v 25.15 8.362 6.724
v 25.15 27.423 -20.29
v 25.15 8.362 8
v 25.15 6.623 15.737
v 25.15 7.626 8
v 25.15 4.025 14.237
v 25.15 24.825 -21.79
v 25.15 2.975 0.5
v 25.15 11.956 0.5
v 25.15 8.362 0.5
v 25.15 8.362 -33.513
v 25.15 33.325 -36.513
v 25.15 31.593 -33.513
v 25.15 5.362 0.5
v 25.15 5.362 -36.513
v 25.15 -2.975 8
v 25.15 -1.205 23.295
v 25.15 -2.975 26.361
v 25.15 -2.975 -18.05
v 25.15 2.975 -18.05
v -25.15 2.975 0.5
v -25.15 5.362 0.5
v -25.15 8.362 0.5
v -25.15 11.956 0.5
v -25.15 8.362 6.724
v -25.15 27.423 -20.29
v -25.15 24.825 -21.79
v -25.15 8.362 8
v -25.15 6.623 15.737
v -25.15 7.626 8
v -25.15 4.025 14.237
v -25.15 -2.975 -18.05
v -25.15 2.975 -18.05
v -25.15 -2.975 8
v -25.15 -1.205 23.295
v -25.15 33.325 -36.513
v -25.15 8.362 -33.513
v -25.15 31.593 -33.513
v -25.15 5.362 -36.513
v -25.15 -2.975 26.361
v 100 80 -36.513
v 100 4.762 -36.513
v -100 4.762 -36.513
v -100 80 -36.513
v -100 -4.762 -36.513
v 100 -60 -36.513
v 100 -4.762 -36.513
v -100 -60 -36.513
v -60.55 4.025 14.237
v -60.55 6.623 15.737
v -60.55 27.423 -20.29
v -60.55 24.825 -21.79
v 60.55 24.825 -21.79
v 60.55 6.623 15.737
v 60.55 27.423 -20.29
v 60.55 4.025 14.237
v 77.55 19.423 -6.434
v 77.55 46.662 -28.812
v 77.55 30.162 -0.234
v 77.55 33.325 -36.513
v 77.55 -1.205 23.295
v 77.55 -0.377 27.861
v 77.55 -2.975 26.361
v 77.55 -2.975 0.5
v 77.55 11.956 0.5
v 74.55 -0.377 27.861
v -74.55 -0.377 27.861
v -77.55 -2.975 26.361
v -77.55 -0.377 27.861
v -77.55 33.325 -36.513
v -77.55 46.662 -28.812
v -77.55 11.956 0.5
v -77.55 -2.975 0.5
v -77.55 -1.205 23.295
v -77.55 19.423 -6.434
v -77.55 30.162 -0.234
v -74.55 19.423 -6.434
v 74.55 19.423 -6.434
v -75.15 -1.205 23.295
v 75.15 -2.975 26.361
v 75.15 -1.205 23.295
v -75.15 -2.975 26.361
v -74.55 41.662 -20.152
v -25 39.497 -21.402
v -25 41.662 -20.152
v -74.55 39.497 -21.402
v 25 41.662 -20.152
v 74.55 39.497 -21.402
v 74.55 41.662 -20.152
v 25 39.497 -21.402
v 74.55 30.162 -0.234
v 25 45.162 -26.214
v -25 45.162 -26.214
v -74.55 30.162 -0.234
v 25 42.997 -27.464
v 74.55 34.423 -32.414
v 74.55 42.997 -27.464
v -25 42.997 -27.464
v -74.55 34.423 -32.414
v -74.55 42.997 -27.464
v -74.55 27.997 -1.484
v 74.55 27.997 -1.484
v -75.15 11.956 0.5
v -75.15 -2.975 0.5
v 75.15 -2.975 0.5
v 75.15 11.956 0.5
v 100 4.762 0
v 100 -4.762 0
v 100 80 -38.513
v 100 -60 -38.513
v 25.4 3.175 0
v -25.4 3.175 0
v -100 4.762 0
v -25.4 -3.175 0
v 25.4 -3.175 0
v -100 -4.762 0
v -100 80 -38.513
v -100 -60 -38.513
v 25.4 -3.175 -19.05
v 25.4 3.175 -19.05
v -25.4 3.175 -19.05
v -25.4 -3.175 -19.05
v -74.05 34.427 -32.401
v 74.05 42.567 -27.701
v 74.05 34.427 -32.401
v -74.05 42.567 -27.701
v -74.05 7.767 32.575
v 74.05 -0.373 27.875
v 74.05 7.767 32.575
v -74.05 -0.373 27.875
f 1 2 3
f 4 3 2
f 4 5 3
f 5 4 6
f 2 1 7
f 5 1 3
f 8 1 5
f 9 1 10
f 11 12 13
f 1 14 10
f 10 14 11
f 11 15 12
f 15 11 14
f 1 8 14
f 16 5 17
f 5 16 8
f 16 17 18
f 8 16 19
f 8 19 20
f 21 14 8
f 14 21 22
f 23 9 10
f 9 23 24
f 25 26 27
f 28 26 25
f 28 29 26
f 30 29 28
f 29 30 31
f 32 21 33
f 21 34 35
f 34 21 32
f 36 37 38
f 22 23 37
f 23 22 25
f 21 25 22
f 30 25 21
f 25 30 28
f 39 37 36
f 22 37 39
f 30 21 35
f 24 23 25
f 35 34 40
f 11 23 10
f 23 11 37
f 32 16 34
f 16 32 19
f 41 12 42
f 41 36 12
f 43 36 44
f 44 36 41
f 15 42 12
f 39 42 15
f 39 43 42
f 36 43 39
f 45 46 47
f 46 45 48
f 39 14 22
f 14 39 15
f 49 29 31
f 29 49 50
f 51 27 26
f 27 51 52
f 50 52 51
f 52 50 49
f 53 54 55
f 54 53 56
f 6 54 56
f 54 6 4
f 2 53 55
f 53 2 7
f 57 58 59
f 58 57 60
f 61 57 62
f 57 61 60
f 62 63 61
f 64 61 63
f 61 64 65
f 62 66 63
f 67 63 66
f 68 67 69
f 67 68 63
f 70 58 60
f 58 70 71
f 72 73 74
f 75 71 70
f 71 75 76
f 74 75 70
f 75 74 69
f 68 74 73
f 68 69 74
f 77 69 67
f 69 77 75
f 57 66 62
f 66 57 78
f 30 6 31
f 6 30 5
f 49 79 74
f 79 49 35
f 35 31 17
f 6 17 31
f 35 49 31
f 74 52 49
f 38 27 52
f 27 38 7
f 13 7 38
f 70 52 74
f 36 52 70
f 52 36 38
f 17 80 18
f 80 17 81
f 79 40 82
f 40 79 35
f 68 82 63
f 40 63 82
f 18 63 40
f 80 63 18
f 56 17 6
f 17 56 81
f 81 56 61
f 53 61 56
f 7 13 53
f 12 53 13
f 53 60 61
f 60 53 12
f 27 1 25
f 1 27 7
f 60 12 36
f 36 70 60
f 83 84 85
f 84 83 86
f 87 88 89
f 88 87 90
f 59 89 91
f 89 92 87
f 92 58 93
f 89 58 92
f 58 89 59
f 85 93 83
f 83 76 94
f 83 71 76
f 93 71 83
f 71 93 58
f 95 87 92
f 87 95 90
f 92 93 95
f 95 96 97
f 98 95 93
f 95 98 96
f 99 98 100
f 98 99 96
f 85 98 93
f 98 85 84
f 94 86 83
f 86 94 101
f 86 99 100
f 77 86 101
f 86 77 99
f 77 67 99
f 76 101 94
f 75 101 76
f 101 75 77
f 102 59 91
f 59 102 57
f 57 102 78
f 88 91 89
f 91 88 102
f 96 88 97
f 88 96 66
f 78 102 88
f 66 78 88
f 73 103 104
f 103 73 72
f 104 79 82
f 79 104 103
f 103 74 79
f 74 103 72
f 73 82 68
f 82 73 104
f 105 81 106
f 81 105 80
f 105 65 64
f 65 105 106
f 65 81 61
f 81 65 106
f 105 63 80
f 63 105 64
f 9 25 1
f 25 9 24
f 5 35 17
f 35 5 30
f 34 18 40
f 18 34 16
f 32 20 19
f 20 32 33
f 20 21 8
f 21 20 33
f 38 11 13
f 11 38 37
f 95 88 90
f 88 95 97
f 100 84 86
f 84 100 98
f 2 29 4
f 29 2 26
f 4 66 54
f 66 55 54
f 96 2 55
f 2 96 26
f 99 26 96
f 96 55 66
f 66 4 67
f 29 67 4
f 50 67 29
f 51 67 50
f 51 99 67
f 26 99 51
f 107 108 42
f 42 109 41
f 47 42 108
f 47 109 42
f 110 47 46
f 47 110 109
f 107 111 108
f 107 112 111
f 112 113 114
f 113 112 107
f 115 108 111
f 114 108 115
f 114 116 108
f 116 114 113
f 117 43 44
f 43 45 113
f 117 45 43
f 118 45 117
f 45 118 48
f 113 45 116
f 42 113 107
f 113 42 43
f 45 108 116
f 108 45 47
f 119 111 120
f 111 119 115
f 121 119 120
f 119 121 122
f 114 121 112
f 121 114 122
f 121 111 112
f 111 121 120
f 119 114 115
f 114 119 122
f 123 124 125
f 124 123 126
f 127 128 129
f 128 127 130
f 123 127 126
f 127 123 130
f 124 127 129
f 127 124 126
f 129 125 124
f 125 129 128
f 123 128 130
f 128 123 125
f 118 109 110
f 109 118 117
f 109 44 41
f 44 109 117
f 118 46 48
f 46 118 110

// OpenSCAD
// ====================================================================
// Player phone holder that plugs into the slot in the TOP of the playing-field border
// One phone, landscape, tilted back so a seated player can read and touch it.
// Dimensions in millimeters (mm). OpenSCAD 2021.01.
// Related: cad/phone_tray_insert.scad (the storage tray insert) and
//          documents/PHONE_TRAY_INSERT_PLAN.md (same phone, same printer).
//
// REVISED 2026-11-17 (2nd): slot is in the TOP of the border (tab points down); nothing may go past
// the back (field-side) face of the tab; the holder stands on the table; prints on its back.
//
// World frame: x runs along the border; y runs across it, y = 0 at the slot's centre, the field
// on the -y side and the player on the +y side; z is up, z = 0 is the border's top face and
// z = -border_h is the table.
//
// One printable part:
//   tab      - a thin blade that drops down into the slot (2" long x 1/4" thick x 3/4" deep)
//   base     - a block that rests on the border's top face between the tab and the outer edge
//   skirt    - a thin plate down the border's OUTER face, standing on the table
//   link     - a strip along the table that joins the skirt's bottom to the cradle's lowest edge
//   cradle   - back plate leaning toward the field, a shelf the phone's long edge stands on, a small
//              front lip and an end post at each end of the phone
//   fill     - a solid block, as wide as the tab, filling the space above the tab (above the border's top
//              face) between the back plane and the cradle's back plate
//   ribs     - one small triangular rib at each end of the cradle, above the border's top face only
//              (there are no ribs below the top of the wall)
//
// The plate leans from the skirt: the steeper the tilt, the closer the phone sits to the wall. The
// plate's back face stays outside the border's outer face (checked by an assert), so the highest
// tilt that works is about 76 degrees. The file is set to 50 (the user's choice).
//
// RULE: no part of the holder is at y < -tab_t/2, the tab's back face. The cradle is pushed OUT
// until its leaning back plate meets that plane at its top, so nothing hangs over the field.
// That plane is also the print bed: the part prints lying on its back with the tab flat on the bed.
//
// PRINTING (part = "print"): the back plane is on the bed. The tab lies flat; the back plate is a
// shallow ramp rising from the bed (90 - tilt degrees from vertical). Everything below the border top (the skirt,
// and the plate and shelf where they hang down toward the table) floats up to about 20 mm above the
// bed: turn on slicer supports, "build plate only", for the plate's back face and the skirt's inner face.
// Cutting the support interface off those two faces is the only cleanup.
//
// MEASURED by the user: border 1 7/16" tall; wall around the slot about 1/16" each side; slot 2" x 1/4" x 3/4".
// ASSUMED: the outer face is flat and vertical right down to the table; the slot is centred (the wall
// is 1/16" on both sides); the table under the holder is level with the table under the border.
// ESTIMATE: the phone's size (retailer spec page).
//
// part = "assembly"  holder + ghost phone + stand-ins for the border and the table (default)
//        "print"     holder only, on its back, as it prints
//        "check"     holder intersected with the phone, the border, the table and the area behind the
//                    tab's back plane; must come out EMPTY
// ====================================================================

part = "assembly";  // "assembly", "print", "check"

// --- 1. SLOT IN THE TOP OF THE BORDER ---
slot_w     = 50.8;       // 2"   : along the border
slot_t     = 6.35;       // 1/4" : across the border
slot_depth = 19.05;      // 3/4" : down into the border

// --- 2. BORDER (measured) ---
slot_to_outer = 1.5875;  // 1/16": wall between the slot and the border's outer face (same on the field side)
border_h      = 36.5125; // 1 7/16": border height = how far down the table is

// --- 3. PHONE (TCL A502DL, same estimates as phone_tray_insert.scad) ---
phone_len  = 148.1;      // ESTIMATE: length (lies along the border, landscape)
phone_w    = 69.6;       // ESTIMATE: width (up the cradle's back plate)
phone_t    = 9.4;        // ESTIMATE: thickness

// --- 4. FIT ---
tab_clear_w = 0.5;       // Tab is narrower than the slot by this (total)
tab_clear_t = 0.4;       // Tab is thinner than the slot by this (total)
tab_inset   = 1.0;       // Tab stops this far short of the slot's bottom
phone_clear = 0.5;       // Gap around the phone: thickness, and 2x this in length
face_gap    = 0.6;       // Gap between the skirt and the border's outer face
top_gap     = 0.5;       // Gap between the base and the border's top face (the holder rests on the table)

// --- 5. POSE ---
tilt        = 60;        // Screen angle from horizontal (90 = upright). Higher = the phone sits closer to the
                         // wall. About 76 is the most that keeps the plate outside the border (assert)
cradle_z    = -border_h; // Height of the cradle's lowest point (the shelf's back-bottom edge) above the
                         // border's top face. -border_h = standing on the table, the lowest it can go.
                         // 0 = level with the border's top. Moving it only moves the phone straight up or
                         // down; it does not change how far out the cradle sits

// --- 6. HOOK (base + skirt) ---
base_h      = 8.0;       // Height of the base block above the border's top face
skirt_t     = 3.0;       // Skirt thickness
hook_w      = slot_w - 0.5;  // Width (along the border) of the base and skirt
link_t      = skirt_t;   // Thickness of the strip along the table that joins the skirt's bottom to the cradle's bottom
link_w      = hook_w;    // Its width (along the border)

// --- 7. CRADLE ---
plate_t     = 3.0;       // Back plate thickness
shelf_t     = 3.0;       // Shelf thickness (under the phone's long edge)
front_lip_t = 2.5;       // Front lip thickness
front_lip_h = 7.0;       // Front lip height above the shelf
end_t       = 3.0;       // End post thickness
end_h       = 30.0;      // End post height above the shelf
back_window = true;      // Cut two windows in the back plate (saves plastic, frees the camera)
window_margin = 14.0;    // Solid plate left around the windows
                         // A solid rib, as wide as the tab, is left between the two windows (see mid_rib_w)
lip_notch_w = 50.0;      // Finger notch cut in the middle of the front lip (0 = none)

// --- 8. RIBS ---
gusset_t    = 2.4;       // Thickness of the rib at each end of the cradle (they sit under the end posts)

// ====================================================================
// DERIVED
// ====================================================================
eps    = 0.01;
tab_w  = slot_w - tab_clear_w;
mid_rib_w = tab_w;                          // width of the solid rib between the two back windows
tab_t  = slot_t - tab_clear_t;
tab_len = slot_depth - tab_inset;

yo     = slot_t / 2 + slot_to_outer;        // border's outer face (and, mirrored, its field-side face)
sk_y0  = yo + face_gap;                     // skirt's inner face
sk_y1  = sk_y0 + skirt_t;                   // skirt's outer face
back_y = -tab_t / 2;                        // THE back plane: nothing goes below this y; it is the print bed

len_in = phone_len + 2 * phone_clear;       // inside length between the end posts
cav_t  = phone_t + phone_clear;             // inside depth of the cradle, plate to front lip
L      = len_in + 2 * end_t;                // overall length of the cradle
plate_h = phone_w;                          // back plate height (the phone's width)

phi = 90 - tilt;                            // rotation of the cradle about X
sp  = sin(phi);
cp  = cos(phi);

// Cradle frame: x along the border; y = depth (plate back at y = -plate_t, plate front at 0);
// z = up the plate. The shelf's top face is at z = 0. Placed by rotate([phi,0,0]) + translate.
// The cradle is pushed out until the plate's top back corner is exactly on the back plane.
yc = back_y + plate_t * cp + plate_h * sp;
zc = plate_t * sp + shelf_t * cp + cradle_z;
function gy(yl, zl) = yl * cp - zl * sp + yc;           // local -> global y
function gz(yl, zl) = yl * sp + zl * cp + zc;           // local -> global z

front_end = cav_t + front_lip_t;            // local y of the shelf's front edge
yB = gy(-plate_t, -shelf_t);                // back-bottom corner of the shelf
zB = gz(-plate_t, -shelf_t);
yF = gy(front_end, -shelf_t);               // front-bottom corner of the shelf
zF = gz(front_end, -shelf_t);
yT = gy(-plate_t, plate_h);                 // top back corner of the plate (= back_y by construction)
zT = gz(-plate_t, plate_h);

assert(tilt > 30 && tilt < 85, "tilt should be between 30 and 85 degrees");
assert(tab_t > 1 && tab_w > 10, "tab is too small: check the slot figures");
y_plate_at_top = yT + zT * tan(phi);        // y of the plate's back face where it crosses the border's top face
assert(y_plate_at_top >= yo + 0.5, str("tilt is too steep: the plate's back face would be inside the border (y = ",
       y_plate_at_top, ", border face at ", yo, "). Lower tilt, or raise cradle_z"));
assert(yB > sk_y1 + 1, "tilt is too steep: the cradle would run into the skirt. Lower tilt");
assert(zB >= -border_h - 0.001, "cradle_z is below the table");
assert(front_lip_t < phone_t, "front lip should be thinner than the phone");
assert(L <= 256 && zT + border_h <= 256 && yF - back_y <= 256, "does not fit the P2S bed (256 x 256 mm)");

echo(str("cradle length=", L, "  shelf front is ", yF - yo, " mm out from the border's outer face",
         "  phone top is ", zT + border_h, " mm above the table",
         "  holder is ", yF - back_y, " mm front to back (the print height)"));

// ====================================================================
// PARTS
// ====================================================================

module tab() {
    translate([-tab_w / 2, back_y, -tab_len])
        cube([tab_w, tab_t, tab_len + top_gap + eps]);
}

// Block on the border's top face from the tab to the skirt, and the skirt down to the table
module hook() {
    translate([-hook_w / 2, back_y, top_gap])
        cube([hook_w, sk_y1 - back_y, base_h - top_gap]);
    translate([-hook_w / 2, sk_y0, -border_h])
        cube([hook_w, skirt_t, border_h + base_h]);
}

// The cradle, in its own frame (before rotating)
module cradle_local() {
    // back plate
    difference() {
        translate([-L / 2, -plate_t, -shelf_t])
            cube([L, plate_t, plate_h + shelf_t]);
        if (back_window)
            // two windows, one each side of the middle rib
            for (s = [-1, 1])
                translate([s > 0 ? mid_rib_w / 2 : -(len_in / 2 - window_margin), -plate_t - 1, window_margin])
                    cube([len_in / 2 - window_margin - mid_rib_w / 2, plate_t + 2, plate_h - 2 * window_margin]);
    }
    // shelf, from the plate's back to the front lip
    translate([-L / 2, -plate_t, -shelf_t])
        cube([L, plate_t + front_end, shelf_t]);
    // front lip, with a finger notch
    difference() {
        translate([-L / 2, cav_t, -shelf_t])
            cube([L, front_lip_t, shelf_t + front_lip_h]);
        if (lip_notch_w > 0)
            translate([-lip_notch_w / 2, cav_t - 1, 0])
                cube([lip_notch_w, front_lip_t + 2, front_lip_h + 1]);
    }
    // end posts
    for (s = [-1, 1])
        translate([s > 0 ? len_in / 2 : -L / 2, -plate_t, -shelf_t])
            cube([end_t, plate_t + front_end, shelf_t + end_h]);
}

// Strip from the skirt's bottom along the table to the cradle's lowest edge (flat when the cradle stands on
// the table; sloped up to it if cradle_z is raised). It ends exactly at that edge (y = yB), inside the
// cradle's back plate, so it never sticks out below the shelf's underside.
module link() {
    hull() {
        translate([-link_w / 2, sk_y0, -border_h])
            cube([link_w, skirt_t, link_t]);
        translate([-link_w / 2, yB - 3, zB])
            cube([link_w, 3, link_t]);
    }
}

module cradle() {
    translate([0, yc, zc])
        rotate([phi, 0, 0])
            cradle_local();
}

// Side view (y, z) of a rib: a triangle above the border's top face, bounded by the back plane (left),
// the plate's back face (right) and the level of the border's top face (bottom). Nothing below the top.
function plate_y_at(z) = yT + (zT - z) * (yB - yT) / (zT - zB);   // plate's back face, at height z
function rib_pts() = [
    [back_y, top_gap],
    [back_y, zT],
    [plate_y_at(top_gap), top_gap]
];

// One rib, or the fill, is this triangle extruded along x
module rib_at(x, w) {
    translate([x - w / 2, 0, 0])
        rotate([90, 0, 90])
            linear_extrude(w)
                polygon(rib_pts());
}

// One rib at each end of the cradle, plus the fill over the tab
module gussets() {
    for (s = [-1, 1])
        rib_at(s * (L / 2 - gusset_t / 2), gusset_t);
    rib_at(0, hook_w);
}

// Space the phone occupies (with clearance), used to trim the holder
module phone_space() {
    translate([0, yc, zc])
        rotate([phi, 0, 0])
            translate([-len_in / 2, 0, 0])
                cube([len_in, cav_t, plate_h + 20]);
}

module holder() {
    difference() {
        union() {
            tab();
            hook();
            link();
            cradle();
            gussets();
        }
        phone_space();
    }
}

// The real phone, no clearance, leaning on the plate: for the collision check
module phone_actual() {
    translate([0, yc, zc])
        rotate([phi, 0, 0])
            translate([-phone_len / 2, 0.01, 0.01])
                cube([phone_len, phone_t, phone_w]);
}

// The border: wall yo on both sides of the slot, border_h tall, with the slot cut in
module border_solid() {
    difference() {
        translate([-100, -yo, -border_h]) cube([200, 2 * yo, border_h]);
        translate([-slot_w / 2, -slot_t / 2, -slot_depth]) cube([slot_w, slot_t, slot_depth + 1]);
    }
}

module table_slab()   { translate([-200, -200, -border_h - 50]) cube([400, 400, 50 - 0.001]); }
module behind_tab()   { translate([-200, -400, -200]) cube([400, 400 + back_y - 0.001, 400]); }

// ====================================================================
// OUTPUT
// ====================================================================
if (part == "print") {
    // lying on its back: the back plane (y = back_y) becomes the bed (z = 0), up (z) becomes -y
    translate([0, 0, -back_y]) rotate([90, 0, 0]) holder();
} else if (part == "check") {
    union() {
        intersection() { holder(); phone_actual(); }
        intersection() { holder(); border_solid(); }
        intersection() { holder(); table_slab(); }
        intersection() { holder(); behind_tab(); }
    }
} else {
    color("orange") holder();
    color("dimgray", 0.5) phone_actual();
    color("saddlebrown", 0.35) border_solid();
    color("silver", 0.2) translate([-100, -60, -border_h - 2]) cube([200, 140, 2]);   // the table
}
